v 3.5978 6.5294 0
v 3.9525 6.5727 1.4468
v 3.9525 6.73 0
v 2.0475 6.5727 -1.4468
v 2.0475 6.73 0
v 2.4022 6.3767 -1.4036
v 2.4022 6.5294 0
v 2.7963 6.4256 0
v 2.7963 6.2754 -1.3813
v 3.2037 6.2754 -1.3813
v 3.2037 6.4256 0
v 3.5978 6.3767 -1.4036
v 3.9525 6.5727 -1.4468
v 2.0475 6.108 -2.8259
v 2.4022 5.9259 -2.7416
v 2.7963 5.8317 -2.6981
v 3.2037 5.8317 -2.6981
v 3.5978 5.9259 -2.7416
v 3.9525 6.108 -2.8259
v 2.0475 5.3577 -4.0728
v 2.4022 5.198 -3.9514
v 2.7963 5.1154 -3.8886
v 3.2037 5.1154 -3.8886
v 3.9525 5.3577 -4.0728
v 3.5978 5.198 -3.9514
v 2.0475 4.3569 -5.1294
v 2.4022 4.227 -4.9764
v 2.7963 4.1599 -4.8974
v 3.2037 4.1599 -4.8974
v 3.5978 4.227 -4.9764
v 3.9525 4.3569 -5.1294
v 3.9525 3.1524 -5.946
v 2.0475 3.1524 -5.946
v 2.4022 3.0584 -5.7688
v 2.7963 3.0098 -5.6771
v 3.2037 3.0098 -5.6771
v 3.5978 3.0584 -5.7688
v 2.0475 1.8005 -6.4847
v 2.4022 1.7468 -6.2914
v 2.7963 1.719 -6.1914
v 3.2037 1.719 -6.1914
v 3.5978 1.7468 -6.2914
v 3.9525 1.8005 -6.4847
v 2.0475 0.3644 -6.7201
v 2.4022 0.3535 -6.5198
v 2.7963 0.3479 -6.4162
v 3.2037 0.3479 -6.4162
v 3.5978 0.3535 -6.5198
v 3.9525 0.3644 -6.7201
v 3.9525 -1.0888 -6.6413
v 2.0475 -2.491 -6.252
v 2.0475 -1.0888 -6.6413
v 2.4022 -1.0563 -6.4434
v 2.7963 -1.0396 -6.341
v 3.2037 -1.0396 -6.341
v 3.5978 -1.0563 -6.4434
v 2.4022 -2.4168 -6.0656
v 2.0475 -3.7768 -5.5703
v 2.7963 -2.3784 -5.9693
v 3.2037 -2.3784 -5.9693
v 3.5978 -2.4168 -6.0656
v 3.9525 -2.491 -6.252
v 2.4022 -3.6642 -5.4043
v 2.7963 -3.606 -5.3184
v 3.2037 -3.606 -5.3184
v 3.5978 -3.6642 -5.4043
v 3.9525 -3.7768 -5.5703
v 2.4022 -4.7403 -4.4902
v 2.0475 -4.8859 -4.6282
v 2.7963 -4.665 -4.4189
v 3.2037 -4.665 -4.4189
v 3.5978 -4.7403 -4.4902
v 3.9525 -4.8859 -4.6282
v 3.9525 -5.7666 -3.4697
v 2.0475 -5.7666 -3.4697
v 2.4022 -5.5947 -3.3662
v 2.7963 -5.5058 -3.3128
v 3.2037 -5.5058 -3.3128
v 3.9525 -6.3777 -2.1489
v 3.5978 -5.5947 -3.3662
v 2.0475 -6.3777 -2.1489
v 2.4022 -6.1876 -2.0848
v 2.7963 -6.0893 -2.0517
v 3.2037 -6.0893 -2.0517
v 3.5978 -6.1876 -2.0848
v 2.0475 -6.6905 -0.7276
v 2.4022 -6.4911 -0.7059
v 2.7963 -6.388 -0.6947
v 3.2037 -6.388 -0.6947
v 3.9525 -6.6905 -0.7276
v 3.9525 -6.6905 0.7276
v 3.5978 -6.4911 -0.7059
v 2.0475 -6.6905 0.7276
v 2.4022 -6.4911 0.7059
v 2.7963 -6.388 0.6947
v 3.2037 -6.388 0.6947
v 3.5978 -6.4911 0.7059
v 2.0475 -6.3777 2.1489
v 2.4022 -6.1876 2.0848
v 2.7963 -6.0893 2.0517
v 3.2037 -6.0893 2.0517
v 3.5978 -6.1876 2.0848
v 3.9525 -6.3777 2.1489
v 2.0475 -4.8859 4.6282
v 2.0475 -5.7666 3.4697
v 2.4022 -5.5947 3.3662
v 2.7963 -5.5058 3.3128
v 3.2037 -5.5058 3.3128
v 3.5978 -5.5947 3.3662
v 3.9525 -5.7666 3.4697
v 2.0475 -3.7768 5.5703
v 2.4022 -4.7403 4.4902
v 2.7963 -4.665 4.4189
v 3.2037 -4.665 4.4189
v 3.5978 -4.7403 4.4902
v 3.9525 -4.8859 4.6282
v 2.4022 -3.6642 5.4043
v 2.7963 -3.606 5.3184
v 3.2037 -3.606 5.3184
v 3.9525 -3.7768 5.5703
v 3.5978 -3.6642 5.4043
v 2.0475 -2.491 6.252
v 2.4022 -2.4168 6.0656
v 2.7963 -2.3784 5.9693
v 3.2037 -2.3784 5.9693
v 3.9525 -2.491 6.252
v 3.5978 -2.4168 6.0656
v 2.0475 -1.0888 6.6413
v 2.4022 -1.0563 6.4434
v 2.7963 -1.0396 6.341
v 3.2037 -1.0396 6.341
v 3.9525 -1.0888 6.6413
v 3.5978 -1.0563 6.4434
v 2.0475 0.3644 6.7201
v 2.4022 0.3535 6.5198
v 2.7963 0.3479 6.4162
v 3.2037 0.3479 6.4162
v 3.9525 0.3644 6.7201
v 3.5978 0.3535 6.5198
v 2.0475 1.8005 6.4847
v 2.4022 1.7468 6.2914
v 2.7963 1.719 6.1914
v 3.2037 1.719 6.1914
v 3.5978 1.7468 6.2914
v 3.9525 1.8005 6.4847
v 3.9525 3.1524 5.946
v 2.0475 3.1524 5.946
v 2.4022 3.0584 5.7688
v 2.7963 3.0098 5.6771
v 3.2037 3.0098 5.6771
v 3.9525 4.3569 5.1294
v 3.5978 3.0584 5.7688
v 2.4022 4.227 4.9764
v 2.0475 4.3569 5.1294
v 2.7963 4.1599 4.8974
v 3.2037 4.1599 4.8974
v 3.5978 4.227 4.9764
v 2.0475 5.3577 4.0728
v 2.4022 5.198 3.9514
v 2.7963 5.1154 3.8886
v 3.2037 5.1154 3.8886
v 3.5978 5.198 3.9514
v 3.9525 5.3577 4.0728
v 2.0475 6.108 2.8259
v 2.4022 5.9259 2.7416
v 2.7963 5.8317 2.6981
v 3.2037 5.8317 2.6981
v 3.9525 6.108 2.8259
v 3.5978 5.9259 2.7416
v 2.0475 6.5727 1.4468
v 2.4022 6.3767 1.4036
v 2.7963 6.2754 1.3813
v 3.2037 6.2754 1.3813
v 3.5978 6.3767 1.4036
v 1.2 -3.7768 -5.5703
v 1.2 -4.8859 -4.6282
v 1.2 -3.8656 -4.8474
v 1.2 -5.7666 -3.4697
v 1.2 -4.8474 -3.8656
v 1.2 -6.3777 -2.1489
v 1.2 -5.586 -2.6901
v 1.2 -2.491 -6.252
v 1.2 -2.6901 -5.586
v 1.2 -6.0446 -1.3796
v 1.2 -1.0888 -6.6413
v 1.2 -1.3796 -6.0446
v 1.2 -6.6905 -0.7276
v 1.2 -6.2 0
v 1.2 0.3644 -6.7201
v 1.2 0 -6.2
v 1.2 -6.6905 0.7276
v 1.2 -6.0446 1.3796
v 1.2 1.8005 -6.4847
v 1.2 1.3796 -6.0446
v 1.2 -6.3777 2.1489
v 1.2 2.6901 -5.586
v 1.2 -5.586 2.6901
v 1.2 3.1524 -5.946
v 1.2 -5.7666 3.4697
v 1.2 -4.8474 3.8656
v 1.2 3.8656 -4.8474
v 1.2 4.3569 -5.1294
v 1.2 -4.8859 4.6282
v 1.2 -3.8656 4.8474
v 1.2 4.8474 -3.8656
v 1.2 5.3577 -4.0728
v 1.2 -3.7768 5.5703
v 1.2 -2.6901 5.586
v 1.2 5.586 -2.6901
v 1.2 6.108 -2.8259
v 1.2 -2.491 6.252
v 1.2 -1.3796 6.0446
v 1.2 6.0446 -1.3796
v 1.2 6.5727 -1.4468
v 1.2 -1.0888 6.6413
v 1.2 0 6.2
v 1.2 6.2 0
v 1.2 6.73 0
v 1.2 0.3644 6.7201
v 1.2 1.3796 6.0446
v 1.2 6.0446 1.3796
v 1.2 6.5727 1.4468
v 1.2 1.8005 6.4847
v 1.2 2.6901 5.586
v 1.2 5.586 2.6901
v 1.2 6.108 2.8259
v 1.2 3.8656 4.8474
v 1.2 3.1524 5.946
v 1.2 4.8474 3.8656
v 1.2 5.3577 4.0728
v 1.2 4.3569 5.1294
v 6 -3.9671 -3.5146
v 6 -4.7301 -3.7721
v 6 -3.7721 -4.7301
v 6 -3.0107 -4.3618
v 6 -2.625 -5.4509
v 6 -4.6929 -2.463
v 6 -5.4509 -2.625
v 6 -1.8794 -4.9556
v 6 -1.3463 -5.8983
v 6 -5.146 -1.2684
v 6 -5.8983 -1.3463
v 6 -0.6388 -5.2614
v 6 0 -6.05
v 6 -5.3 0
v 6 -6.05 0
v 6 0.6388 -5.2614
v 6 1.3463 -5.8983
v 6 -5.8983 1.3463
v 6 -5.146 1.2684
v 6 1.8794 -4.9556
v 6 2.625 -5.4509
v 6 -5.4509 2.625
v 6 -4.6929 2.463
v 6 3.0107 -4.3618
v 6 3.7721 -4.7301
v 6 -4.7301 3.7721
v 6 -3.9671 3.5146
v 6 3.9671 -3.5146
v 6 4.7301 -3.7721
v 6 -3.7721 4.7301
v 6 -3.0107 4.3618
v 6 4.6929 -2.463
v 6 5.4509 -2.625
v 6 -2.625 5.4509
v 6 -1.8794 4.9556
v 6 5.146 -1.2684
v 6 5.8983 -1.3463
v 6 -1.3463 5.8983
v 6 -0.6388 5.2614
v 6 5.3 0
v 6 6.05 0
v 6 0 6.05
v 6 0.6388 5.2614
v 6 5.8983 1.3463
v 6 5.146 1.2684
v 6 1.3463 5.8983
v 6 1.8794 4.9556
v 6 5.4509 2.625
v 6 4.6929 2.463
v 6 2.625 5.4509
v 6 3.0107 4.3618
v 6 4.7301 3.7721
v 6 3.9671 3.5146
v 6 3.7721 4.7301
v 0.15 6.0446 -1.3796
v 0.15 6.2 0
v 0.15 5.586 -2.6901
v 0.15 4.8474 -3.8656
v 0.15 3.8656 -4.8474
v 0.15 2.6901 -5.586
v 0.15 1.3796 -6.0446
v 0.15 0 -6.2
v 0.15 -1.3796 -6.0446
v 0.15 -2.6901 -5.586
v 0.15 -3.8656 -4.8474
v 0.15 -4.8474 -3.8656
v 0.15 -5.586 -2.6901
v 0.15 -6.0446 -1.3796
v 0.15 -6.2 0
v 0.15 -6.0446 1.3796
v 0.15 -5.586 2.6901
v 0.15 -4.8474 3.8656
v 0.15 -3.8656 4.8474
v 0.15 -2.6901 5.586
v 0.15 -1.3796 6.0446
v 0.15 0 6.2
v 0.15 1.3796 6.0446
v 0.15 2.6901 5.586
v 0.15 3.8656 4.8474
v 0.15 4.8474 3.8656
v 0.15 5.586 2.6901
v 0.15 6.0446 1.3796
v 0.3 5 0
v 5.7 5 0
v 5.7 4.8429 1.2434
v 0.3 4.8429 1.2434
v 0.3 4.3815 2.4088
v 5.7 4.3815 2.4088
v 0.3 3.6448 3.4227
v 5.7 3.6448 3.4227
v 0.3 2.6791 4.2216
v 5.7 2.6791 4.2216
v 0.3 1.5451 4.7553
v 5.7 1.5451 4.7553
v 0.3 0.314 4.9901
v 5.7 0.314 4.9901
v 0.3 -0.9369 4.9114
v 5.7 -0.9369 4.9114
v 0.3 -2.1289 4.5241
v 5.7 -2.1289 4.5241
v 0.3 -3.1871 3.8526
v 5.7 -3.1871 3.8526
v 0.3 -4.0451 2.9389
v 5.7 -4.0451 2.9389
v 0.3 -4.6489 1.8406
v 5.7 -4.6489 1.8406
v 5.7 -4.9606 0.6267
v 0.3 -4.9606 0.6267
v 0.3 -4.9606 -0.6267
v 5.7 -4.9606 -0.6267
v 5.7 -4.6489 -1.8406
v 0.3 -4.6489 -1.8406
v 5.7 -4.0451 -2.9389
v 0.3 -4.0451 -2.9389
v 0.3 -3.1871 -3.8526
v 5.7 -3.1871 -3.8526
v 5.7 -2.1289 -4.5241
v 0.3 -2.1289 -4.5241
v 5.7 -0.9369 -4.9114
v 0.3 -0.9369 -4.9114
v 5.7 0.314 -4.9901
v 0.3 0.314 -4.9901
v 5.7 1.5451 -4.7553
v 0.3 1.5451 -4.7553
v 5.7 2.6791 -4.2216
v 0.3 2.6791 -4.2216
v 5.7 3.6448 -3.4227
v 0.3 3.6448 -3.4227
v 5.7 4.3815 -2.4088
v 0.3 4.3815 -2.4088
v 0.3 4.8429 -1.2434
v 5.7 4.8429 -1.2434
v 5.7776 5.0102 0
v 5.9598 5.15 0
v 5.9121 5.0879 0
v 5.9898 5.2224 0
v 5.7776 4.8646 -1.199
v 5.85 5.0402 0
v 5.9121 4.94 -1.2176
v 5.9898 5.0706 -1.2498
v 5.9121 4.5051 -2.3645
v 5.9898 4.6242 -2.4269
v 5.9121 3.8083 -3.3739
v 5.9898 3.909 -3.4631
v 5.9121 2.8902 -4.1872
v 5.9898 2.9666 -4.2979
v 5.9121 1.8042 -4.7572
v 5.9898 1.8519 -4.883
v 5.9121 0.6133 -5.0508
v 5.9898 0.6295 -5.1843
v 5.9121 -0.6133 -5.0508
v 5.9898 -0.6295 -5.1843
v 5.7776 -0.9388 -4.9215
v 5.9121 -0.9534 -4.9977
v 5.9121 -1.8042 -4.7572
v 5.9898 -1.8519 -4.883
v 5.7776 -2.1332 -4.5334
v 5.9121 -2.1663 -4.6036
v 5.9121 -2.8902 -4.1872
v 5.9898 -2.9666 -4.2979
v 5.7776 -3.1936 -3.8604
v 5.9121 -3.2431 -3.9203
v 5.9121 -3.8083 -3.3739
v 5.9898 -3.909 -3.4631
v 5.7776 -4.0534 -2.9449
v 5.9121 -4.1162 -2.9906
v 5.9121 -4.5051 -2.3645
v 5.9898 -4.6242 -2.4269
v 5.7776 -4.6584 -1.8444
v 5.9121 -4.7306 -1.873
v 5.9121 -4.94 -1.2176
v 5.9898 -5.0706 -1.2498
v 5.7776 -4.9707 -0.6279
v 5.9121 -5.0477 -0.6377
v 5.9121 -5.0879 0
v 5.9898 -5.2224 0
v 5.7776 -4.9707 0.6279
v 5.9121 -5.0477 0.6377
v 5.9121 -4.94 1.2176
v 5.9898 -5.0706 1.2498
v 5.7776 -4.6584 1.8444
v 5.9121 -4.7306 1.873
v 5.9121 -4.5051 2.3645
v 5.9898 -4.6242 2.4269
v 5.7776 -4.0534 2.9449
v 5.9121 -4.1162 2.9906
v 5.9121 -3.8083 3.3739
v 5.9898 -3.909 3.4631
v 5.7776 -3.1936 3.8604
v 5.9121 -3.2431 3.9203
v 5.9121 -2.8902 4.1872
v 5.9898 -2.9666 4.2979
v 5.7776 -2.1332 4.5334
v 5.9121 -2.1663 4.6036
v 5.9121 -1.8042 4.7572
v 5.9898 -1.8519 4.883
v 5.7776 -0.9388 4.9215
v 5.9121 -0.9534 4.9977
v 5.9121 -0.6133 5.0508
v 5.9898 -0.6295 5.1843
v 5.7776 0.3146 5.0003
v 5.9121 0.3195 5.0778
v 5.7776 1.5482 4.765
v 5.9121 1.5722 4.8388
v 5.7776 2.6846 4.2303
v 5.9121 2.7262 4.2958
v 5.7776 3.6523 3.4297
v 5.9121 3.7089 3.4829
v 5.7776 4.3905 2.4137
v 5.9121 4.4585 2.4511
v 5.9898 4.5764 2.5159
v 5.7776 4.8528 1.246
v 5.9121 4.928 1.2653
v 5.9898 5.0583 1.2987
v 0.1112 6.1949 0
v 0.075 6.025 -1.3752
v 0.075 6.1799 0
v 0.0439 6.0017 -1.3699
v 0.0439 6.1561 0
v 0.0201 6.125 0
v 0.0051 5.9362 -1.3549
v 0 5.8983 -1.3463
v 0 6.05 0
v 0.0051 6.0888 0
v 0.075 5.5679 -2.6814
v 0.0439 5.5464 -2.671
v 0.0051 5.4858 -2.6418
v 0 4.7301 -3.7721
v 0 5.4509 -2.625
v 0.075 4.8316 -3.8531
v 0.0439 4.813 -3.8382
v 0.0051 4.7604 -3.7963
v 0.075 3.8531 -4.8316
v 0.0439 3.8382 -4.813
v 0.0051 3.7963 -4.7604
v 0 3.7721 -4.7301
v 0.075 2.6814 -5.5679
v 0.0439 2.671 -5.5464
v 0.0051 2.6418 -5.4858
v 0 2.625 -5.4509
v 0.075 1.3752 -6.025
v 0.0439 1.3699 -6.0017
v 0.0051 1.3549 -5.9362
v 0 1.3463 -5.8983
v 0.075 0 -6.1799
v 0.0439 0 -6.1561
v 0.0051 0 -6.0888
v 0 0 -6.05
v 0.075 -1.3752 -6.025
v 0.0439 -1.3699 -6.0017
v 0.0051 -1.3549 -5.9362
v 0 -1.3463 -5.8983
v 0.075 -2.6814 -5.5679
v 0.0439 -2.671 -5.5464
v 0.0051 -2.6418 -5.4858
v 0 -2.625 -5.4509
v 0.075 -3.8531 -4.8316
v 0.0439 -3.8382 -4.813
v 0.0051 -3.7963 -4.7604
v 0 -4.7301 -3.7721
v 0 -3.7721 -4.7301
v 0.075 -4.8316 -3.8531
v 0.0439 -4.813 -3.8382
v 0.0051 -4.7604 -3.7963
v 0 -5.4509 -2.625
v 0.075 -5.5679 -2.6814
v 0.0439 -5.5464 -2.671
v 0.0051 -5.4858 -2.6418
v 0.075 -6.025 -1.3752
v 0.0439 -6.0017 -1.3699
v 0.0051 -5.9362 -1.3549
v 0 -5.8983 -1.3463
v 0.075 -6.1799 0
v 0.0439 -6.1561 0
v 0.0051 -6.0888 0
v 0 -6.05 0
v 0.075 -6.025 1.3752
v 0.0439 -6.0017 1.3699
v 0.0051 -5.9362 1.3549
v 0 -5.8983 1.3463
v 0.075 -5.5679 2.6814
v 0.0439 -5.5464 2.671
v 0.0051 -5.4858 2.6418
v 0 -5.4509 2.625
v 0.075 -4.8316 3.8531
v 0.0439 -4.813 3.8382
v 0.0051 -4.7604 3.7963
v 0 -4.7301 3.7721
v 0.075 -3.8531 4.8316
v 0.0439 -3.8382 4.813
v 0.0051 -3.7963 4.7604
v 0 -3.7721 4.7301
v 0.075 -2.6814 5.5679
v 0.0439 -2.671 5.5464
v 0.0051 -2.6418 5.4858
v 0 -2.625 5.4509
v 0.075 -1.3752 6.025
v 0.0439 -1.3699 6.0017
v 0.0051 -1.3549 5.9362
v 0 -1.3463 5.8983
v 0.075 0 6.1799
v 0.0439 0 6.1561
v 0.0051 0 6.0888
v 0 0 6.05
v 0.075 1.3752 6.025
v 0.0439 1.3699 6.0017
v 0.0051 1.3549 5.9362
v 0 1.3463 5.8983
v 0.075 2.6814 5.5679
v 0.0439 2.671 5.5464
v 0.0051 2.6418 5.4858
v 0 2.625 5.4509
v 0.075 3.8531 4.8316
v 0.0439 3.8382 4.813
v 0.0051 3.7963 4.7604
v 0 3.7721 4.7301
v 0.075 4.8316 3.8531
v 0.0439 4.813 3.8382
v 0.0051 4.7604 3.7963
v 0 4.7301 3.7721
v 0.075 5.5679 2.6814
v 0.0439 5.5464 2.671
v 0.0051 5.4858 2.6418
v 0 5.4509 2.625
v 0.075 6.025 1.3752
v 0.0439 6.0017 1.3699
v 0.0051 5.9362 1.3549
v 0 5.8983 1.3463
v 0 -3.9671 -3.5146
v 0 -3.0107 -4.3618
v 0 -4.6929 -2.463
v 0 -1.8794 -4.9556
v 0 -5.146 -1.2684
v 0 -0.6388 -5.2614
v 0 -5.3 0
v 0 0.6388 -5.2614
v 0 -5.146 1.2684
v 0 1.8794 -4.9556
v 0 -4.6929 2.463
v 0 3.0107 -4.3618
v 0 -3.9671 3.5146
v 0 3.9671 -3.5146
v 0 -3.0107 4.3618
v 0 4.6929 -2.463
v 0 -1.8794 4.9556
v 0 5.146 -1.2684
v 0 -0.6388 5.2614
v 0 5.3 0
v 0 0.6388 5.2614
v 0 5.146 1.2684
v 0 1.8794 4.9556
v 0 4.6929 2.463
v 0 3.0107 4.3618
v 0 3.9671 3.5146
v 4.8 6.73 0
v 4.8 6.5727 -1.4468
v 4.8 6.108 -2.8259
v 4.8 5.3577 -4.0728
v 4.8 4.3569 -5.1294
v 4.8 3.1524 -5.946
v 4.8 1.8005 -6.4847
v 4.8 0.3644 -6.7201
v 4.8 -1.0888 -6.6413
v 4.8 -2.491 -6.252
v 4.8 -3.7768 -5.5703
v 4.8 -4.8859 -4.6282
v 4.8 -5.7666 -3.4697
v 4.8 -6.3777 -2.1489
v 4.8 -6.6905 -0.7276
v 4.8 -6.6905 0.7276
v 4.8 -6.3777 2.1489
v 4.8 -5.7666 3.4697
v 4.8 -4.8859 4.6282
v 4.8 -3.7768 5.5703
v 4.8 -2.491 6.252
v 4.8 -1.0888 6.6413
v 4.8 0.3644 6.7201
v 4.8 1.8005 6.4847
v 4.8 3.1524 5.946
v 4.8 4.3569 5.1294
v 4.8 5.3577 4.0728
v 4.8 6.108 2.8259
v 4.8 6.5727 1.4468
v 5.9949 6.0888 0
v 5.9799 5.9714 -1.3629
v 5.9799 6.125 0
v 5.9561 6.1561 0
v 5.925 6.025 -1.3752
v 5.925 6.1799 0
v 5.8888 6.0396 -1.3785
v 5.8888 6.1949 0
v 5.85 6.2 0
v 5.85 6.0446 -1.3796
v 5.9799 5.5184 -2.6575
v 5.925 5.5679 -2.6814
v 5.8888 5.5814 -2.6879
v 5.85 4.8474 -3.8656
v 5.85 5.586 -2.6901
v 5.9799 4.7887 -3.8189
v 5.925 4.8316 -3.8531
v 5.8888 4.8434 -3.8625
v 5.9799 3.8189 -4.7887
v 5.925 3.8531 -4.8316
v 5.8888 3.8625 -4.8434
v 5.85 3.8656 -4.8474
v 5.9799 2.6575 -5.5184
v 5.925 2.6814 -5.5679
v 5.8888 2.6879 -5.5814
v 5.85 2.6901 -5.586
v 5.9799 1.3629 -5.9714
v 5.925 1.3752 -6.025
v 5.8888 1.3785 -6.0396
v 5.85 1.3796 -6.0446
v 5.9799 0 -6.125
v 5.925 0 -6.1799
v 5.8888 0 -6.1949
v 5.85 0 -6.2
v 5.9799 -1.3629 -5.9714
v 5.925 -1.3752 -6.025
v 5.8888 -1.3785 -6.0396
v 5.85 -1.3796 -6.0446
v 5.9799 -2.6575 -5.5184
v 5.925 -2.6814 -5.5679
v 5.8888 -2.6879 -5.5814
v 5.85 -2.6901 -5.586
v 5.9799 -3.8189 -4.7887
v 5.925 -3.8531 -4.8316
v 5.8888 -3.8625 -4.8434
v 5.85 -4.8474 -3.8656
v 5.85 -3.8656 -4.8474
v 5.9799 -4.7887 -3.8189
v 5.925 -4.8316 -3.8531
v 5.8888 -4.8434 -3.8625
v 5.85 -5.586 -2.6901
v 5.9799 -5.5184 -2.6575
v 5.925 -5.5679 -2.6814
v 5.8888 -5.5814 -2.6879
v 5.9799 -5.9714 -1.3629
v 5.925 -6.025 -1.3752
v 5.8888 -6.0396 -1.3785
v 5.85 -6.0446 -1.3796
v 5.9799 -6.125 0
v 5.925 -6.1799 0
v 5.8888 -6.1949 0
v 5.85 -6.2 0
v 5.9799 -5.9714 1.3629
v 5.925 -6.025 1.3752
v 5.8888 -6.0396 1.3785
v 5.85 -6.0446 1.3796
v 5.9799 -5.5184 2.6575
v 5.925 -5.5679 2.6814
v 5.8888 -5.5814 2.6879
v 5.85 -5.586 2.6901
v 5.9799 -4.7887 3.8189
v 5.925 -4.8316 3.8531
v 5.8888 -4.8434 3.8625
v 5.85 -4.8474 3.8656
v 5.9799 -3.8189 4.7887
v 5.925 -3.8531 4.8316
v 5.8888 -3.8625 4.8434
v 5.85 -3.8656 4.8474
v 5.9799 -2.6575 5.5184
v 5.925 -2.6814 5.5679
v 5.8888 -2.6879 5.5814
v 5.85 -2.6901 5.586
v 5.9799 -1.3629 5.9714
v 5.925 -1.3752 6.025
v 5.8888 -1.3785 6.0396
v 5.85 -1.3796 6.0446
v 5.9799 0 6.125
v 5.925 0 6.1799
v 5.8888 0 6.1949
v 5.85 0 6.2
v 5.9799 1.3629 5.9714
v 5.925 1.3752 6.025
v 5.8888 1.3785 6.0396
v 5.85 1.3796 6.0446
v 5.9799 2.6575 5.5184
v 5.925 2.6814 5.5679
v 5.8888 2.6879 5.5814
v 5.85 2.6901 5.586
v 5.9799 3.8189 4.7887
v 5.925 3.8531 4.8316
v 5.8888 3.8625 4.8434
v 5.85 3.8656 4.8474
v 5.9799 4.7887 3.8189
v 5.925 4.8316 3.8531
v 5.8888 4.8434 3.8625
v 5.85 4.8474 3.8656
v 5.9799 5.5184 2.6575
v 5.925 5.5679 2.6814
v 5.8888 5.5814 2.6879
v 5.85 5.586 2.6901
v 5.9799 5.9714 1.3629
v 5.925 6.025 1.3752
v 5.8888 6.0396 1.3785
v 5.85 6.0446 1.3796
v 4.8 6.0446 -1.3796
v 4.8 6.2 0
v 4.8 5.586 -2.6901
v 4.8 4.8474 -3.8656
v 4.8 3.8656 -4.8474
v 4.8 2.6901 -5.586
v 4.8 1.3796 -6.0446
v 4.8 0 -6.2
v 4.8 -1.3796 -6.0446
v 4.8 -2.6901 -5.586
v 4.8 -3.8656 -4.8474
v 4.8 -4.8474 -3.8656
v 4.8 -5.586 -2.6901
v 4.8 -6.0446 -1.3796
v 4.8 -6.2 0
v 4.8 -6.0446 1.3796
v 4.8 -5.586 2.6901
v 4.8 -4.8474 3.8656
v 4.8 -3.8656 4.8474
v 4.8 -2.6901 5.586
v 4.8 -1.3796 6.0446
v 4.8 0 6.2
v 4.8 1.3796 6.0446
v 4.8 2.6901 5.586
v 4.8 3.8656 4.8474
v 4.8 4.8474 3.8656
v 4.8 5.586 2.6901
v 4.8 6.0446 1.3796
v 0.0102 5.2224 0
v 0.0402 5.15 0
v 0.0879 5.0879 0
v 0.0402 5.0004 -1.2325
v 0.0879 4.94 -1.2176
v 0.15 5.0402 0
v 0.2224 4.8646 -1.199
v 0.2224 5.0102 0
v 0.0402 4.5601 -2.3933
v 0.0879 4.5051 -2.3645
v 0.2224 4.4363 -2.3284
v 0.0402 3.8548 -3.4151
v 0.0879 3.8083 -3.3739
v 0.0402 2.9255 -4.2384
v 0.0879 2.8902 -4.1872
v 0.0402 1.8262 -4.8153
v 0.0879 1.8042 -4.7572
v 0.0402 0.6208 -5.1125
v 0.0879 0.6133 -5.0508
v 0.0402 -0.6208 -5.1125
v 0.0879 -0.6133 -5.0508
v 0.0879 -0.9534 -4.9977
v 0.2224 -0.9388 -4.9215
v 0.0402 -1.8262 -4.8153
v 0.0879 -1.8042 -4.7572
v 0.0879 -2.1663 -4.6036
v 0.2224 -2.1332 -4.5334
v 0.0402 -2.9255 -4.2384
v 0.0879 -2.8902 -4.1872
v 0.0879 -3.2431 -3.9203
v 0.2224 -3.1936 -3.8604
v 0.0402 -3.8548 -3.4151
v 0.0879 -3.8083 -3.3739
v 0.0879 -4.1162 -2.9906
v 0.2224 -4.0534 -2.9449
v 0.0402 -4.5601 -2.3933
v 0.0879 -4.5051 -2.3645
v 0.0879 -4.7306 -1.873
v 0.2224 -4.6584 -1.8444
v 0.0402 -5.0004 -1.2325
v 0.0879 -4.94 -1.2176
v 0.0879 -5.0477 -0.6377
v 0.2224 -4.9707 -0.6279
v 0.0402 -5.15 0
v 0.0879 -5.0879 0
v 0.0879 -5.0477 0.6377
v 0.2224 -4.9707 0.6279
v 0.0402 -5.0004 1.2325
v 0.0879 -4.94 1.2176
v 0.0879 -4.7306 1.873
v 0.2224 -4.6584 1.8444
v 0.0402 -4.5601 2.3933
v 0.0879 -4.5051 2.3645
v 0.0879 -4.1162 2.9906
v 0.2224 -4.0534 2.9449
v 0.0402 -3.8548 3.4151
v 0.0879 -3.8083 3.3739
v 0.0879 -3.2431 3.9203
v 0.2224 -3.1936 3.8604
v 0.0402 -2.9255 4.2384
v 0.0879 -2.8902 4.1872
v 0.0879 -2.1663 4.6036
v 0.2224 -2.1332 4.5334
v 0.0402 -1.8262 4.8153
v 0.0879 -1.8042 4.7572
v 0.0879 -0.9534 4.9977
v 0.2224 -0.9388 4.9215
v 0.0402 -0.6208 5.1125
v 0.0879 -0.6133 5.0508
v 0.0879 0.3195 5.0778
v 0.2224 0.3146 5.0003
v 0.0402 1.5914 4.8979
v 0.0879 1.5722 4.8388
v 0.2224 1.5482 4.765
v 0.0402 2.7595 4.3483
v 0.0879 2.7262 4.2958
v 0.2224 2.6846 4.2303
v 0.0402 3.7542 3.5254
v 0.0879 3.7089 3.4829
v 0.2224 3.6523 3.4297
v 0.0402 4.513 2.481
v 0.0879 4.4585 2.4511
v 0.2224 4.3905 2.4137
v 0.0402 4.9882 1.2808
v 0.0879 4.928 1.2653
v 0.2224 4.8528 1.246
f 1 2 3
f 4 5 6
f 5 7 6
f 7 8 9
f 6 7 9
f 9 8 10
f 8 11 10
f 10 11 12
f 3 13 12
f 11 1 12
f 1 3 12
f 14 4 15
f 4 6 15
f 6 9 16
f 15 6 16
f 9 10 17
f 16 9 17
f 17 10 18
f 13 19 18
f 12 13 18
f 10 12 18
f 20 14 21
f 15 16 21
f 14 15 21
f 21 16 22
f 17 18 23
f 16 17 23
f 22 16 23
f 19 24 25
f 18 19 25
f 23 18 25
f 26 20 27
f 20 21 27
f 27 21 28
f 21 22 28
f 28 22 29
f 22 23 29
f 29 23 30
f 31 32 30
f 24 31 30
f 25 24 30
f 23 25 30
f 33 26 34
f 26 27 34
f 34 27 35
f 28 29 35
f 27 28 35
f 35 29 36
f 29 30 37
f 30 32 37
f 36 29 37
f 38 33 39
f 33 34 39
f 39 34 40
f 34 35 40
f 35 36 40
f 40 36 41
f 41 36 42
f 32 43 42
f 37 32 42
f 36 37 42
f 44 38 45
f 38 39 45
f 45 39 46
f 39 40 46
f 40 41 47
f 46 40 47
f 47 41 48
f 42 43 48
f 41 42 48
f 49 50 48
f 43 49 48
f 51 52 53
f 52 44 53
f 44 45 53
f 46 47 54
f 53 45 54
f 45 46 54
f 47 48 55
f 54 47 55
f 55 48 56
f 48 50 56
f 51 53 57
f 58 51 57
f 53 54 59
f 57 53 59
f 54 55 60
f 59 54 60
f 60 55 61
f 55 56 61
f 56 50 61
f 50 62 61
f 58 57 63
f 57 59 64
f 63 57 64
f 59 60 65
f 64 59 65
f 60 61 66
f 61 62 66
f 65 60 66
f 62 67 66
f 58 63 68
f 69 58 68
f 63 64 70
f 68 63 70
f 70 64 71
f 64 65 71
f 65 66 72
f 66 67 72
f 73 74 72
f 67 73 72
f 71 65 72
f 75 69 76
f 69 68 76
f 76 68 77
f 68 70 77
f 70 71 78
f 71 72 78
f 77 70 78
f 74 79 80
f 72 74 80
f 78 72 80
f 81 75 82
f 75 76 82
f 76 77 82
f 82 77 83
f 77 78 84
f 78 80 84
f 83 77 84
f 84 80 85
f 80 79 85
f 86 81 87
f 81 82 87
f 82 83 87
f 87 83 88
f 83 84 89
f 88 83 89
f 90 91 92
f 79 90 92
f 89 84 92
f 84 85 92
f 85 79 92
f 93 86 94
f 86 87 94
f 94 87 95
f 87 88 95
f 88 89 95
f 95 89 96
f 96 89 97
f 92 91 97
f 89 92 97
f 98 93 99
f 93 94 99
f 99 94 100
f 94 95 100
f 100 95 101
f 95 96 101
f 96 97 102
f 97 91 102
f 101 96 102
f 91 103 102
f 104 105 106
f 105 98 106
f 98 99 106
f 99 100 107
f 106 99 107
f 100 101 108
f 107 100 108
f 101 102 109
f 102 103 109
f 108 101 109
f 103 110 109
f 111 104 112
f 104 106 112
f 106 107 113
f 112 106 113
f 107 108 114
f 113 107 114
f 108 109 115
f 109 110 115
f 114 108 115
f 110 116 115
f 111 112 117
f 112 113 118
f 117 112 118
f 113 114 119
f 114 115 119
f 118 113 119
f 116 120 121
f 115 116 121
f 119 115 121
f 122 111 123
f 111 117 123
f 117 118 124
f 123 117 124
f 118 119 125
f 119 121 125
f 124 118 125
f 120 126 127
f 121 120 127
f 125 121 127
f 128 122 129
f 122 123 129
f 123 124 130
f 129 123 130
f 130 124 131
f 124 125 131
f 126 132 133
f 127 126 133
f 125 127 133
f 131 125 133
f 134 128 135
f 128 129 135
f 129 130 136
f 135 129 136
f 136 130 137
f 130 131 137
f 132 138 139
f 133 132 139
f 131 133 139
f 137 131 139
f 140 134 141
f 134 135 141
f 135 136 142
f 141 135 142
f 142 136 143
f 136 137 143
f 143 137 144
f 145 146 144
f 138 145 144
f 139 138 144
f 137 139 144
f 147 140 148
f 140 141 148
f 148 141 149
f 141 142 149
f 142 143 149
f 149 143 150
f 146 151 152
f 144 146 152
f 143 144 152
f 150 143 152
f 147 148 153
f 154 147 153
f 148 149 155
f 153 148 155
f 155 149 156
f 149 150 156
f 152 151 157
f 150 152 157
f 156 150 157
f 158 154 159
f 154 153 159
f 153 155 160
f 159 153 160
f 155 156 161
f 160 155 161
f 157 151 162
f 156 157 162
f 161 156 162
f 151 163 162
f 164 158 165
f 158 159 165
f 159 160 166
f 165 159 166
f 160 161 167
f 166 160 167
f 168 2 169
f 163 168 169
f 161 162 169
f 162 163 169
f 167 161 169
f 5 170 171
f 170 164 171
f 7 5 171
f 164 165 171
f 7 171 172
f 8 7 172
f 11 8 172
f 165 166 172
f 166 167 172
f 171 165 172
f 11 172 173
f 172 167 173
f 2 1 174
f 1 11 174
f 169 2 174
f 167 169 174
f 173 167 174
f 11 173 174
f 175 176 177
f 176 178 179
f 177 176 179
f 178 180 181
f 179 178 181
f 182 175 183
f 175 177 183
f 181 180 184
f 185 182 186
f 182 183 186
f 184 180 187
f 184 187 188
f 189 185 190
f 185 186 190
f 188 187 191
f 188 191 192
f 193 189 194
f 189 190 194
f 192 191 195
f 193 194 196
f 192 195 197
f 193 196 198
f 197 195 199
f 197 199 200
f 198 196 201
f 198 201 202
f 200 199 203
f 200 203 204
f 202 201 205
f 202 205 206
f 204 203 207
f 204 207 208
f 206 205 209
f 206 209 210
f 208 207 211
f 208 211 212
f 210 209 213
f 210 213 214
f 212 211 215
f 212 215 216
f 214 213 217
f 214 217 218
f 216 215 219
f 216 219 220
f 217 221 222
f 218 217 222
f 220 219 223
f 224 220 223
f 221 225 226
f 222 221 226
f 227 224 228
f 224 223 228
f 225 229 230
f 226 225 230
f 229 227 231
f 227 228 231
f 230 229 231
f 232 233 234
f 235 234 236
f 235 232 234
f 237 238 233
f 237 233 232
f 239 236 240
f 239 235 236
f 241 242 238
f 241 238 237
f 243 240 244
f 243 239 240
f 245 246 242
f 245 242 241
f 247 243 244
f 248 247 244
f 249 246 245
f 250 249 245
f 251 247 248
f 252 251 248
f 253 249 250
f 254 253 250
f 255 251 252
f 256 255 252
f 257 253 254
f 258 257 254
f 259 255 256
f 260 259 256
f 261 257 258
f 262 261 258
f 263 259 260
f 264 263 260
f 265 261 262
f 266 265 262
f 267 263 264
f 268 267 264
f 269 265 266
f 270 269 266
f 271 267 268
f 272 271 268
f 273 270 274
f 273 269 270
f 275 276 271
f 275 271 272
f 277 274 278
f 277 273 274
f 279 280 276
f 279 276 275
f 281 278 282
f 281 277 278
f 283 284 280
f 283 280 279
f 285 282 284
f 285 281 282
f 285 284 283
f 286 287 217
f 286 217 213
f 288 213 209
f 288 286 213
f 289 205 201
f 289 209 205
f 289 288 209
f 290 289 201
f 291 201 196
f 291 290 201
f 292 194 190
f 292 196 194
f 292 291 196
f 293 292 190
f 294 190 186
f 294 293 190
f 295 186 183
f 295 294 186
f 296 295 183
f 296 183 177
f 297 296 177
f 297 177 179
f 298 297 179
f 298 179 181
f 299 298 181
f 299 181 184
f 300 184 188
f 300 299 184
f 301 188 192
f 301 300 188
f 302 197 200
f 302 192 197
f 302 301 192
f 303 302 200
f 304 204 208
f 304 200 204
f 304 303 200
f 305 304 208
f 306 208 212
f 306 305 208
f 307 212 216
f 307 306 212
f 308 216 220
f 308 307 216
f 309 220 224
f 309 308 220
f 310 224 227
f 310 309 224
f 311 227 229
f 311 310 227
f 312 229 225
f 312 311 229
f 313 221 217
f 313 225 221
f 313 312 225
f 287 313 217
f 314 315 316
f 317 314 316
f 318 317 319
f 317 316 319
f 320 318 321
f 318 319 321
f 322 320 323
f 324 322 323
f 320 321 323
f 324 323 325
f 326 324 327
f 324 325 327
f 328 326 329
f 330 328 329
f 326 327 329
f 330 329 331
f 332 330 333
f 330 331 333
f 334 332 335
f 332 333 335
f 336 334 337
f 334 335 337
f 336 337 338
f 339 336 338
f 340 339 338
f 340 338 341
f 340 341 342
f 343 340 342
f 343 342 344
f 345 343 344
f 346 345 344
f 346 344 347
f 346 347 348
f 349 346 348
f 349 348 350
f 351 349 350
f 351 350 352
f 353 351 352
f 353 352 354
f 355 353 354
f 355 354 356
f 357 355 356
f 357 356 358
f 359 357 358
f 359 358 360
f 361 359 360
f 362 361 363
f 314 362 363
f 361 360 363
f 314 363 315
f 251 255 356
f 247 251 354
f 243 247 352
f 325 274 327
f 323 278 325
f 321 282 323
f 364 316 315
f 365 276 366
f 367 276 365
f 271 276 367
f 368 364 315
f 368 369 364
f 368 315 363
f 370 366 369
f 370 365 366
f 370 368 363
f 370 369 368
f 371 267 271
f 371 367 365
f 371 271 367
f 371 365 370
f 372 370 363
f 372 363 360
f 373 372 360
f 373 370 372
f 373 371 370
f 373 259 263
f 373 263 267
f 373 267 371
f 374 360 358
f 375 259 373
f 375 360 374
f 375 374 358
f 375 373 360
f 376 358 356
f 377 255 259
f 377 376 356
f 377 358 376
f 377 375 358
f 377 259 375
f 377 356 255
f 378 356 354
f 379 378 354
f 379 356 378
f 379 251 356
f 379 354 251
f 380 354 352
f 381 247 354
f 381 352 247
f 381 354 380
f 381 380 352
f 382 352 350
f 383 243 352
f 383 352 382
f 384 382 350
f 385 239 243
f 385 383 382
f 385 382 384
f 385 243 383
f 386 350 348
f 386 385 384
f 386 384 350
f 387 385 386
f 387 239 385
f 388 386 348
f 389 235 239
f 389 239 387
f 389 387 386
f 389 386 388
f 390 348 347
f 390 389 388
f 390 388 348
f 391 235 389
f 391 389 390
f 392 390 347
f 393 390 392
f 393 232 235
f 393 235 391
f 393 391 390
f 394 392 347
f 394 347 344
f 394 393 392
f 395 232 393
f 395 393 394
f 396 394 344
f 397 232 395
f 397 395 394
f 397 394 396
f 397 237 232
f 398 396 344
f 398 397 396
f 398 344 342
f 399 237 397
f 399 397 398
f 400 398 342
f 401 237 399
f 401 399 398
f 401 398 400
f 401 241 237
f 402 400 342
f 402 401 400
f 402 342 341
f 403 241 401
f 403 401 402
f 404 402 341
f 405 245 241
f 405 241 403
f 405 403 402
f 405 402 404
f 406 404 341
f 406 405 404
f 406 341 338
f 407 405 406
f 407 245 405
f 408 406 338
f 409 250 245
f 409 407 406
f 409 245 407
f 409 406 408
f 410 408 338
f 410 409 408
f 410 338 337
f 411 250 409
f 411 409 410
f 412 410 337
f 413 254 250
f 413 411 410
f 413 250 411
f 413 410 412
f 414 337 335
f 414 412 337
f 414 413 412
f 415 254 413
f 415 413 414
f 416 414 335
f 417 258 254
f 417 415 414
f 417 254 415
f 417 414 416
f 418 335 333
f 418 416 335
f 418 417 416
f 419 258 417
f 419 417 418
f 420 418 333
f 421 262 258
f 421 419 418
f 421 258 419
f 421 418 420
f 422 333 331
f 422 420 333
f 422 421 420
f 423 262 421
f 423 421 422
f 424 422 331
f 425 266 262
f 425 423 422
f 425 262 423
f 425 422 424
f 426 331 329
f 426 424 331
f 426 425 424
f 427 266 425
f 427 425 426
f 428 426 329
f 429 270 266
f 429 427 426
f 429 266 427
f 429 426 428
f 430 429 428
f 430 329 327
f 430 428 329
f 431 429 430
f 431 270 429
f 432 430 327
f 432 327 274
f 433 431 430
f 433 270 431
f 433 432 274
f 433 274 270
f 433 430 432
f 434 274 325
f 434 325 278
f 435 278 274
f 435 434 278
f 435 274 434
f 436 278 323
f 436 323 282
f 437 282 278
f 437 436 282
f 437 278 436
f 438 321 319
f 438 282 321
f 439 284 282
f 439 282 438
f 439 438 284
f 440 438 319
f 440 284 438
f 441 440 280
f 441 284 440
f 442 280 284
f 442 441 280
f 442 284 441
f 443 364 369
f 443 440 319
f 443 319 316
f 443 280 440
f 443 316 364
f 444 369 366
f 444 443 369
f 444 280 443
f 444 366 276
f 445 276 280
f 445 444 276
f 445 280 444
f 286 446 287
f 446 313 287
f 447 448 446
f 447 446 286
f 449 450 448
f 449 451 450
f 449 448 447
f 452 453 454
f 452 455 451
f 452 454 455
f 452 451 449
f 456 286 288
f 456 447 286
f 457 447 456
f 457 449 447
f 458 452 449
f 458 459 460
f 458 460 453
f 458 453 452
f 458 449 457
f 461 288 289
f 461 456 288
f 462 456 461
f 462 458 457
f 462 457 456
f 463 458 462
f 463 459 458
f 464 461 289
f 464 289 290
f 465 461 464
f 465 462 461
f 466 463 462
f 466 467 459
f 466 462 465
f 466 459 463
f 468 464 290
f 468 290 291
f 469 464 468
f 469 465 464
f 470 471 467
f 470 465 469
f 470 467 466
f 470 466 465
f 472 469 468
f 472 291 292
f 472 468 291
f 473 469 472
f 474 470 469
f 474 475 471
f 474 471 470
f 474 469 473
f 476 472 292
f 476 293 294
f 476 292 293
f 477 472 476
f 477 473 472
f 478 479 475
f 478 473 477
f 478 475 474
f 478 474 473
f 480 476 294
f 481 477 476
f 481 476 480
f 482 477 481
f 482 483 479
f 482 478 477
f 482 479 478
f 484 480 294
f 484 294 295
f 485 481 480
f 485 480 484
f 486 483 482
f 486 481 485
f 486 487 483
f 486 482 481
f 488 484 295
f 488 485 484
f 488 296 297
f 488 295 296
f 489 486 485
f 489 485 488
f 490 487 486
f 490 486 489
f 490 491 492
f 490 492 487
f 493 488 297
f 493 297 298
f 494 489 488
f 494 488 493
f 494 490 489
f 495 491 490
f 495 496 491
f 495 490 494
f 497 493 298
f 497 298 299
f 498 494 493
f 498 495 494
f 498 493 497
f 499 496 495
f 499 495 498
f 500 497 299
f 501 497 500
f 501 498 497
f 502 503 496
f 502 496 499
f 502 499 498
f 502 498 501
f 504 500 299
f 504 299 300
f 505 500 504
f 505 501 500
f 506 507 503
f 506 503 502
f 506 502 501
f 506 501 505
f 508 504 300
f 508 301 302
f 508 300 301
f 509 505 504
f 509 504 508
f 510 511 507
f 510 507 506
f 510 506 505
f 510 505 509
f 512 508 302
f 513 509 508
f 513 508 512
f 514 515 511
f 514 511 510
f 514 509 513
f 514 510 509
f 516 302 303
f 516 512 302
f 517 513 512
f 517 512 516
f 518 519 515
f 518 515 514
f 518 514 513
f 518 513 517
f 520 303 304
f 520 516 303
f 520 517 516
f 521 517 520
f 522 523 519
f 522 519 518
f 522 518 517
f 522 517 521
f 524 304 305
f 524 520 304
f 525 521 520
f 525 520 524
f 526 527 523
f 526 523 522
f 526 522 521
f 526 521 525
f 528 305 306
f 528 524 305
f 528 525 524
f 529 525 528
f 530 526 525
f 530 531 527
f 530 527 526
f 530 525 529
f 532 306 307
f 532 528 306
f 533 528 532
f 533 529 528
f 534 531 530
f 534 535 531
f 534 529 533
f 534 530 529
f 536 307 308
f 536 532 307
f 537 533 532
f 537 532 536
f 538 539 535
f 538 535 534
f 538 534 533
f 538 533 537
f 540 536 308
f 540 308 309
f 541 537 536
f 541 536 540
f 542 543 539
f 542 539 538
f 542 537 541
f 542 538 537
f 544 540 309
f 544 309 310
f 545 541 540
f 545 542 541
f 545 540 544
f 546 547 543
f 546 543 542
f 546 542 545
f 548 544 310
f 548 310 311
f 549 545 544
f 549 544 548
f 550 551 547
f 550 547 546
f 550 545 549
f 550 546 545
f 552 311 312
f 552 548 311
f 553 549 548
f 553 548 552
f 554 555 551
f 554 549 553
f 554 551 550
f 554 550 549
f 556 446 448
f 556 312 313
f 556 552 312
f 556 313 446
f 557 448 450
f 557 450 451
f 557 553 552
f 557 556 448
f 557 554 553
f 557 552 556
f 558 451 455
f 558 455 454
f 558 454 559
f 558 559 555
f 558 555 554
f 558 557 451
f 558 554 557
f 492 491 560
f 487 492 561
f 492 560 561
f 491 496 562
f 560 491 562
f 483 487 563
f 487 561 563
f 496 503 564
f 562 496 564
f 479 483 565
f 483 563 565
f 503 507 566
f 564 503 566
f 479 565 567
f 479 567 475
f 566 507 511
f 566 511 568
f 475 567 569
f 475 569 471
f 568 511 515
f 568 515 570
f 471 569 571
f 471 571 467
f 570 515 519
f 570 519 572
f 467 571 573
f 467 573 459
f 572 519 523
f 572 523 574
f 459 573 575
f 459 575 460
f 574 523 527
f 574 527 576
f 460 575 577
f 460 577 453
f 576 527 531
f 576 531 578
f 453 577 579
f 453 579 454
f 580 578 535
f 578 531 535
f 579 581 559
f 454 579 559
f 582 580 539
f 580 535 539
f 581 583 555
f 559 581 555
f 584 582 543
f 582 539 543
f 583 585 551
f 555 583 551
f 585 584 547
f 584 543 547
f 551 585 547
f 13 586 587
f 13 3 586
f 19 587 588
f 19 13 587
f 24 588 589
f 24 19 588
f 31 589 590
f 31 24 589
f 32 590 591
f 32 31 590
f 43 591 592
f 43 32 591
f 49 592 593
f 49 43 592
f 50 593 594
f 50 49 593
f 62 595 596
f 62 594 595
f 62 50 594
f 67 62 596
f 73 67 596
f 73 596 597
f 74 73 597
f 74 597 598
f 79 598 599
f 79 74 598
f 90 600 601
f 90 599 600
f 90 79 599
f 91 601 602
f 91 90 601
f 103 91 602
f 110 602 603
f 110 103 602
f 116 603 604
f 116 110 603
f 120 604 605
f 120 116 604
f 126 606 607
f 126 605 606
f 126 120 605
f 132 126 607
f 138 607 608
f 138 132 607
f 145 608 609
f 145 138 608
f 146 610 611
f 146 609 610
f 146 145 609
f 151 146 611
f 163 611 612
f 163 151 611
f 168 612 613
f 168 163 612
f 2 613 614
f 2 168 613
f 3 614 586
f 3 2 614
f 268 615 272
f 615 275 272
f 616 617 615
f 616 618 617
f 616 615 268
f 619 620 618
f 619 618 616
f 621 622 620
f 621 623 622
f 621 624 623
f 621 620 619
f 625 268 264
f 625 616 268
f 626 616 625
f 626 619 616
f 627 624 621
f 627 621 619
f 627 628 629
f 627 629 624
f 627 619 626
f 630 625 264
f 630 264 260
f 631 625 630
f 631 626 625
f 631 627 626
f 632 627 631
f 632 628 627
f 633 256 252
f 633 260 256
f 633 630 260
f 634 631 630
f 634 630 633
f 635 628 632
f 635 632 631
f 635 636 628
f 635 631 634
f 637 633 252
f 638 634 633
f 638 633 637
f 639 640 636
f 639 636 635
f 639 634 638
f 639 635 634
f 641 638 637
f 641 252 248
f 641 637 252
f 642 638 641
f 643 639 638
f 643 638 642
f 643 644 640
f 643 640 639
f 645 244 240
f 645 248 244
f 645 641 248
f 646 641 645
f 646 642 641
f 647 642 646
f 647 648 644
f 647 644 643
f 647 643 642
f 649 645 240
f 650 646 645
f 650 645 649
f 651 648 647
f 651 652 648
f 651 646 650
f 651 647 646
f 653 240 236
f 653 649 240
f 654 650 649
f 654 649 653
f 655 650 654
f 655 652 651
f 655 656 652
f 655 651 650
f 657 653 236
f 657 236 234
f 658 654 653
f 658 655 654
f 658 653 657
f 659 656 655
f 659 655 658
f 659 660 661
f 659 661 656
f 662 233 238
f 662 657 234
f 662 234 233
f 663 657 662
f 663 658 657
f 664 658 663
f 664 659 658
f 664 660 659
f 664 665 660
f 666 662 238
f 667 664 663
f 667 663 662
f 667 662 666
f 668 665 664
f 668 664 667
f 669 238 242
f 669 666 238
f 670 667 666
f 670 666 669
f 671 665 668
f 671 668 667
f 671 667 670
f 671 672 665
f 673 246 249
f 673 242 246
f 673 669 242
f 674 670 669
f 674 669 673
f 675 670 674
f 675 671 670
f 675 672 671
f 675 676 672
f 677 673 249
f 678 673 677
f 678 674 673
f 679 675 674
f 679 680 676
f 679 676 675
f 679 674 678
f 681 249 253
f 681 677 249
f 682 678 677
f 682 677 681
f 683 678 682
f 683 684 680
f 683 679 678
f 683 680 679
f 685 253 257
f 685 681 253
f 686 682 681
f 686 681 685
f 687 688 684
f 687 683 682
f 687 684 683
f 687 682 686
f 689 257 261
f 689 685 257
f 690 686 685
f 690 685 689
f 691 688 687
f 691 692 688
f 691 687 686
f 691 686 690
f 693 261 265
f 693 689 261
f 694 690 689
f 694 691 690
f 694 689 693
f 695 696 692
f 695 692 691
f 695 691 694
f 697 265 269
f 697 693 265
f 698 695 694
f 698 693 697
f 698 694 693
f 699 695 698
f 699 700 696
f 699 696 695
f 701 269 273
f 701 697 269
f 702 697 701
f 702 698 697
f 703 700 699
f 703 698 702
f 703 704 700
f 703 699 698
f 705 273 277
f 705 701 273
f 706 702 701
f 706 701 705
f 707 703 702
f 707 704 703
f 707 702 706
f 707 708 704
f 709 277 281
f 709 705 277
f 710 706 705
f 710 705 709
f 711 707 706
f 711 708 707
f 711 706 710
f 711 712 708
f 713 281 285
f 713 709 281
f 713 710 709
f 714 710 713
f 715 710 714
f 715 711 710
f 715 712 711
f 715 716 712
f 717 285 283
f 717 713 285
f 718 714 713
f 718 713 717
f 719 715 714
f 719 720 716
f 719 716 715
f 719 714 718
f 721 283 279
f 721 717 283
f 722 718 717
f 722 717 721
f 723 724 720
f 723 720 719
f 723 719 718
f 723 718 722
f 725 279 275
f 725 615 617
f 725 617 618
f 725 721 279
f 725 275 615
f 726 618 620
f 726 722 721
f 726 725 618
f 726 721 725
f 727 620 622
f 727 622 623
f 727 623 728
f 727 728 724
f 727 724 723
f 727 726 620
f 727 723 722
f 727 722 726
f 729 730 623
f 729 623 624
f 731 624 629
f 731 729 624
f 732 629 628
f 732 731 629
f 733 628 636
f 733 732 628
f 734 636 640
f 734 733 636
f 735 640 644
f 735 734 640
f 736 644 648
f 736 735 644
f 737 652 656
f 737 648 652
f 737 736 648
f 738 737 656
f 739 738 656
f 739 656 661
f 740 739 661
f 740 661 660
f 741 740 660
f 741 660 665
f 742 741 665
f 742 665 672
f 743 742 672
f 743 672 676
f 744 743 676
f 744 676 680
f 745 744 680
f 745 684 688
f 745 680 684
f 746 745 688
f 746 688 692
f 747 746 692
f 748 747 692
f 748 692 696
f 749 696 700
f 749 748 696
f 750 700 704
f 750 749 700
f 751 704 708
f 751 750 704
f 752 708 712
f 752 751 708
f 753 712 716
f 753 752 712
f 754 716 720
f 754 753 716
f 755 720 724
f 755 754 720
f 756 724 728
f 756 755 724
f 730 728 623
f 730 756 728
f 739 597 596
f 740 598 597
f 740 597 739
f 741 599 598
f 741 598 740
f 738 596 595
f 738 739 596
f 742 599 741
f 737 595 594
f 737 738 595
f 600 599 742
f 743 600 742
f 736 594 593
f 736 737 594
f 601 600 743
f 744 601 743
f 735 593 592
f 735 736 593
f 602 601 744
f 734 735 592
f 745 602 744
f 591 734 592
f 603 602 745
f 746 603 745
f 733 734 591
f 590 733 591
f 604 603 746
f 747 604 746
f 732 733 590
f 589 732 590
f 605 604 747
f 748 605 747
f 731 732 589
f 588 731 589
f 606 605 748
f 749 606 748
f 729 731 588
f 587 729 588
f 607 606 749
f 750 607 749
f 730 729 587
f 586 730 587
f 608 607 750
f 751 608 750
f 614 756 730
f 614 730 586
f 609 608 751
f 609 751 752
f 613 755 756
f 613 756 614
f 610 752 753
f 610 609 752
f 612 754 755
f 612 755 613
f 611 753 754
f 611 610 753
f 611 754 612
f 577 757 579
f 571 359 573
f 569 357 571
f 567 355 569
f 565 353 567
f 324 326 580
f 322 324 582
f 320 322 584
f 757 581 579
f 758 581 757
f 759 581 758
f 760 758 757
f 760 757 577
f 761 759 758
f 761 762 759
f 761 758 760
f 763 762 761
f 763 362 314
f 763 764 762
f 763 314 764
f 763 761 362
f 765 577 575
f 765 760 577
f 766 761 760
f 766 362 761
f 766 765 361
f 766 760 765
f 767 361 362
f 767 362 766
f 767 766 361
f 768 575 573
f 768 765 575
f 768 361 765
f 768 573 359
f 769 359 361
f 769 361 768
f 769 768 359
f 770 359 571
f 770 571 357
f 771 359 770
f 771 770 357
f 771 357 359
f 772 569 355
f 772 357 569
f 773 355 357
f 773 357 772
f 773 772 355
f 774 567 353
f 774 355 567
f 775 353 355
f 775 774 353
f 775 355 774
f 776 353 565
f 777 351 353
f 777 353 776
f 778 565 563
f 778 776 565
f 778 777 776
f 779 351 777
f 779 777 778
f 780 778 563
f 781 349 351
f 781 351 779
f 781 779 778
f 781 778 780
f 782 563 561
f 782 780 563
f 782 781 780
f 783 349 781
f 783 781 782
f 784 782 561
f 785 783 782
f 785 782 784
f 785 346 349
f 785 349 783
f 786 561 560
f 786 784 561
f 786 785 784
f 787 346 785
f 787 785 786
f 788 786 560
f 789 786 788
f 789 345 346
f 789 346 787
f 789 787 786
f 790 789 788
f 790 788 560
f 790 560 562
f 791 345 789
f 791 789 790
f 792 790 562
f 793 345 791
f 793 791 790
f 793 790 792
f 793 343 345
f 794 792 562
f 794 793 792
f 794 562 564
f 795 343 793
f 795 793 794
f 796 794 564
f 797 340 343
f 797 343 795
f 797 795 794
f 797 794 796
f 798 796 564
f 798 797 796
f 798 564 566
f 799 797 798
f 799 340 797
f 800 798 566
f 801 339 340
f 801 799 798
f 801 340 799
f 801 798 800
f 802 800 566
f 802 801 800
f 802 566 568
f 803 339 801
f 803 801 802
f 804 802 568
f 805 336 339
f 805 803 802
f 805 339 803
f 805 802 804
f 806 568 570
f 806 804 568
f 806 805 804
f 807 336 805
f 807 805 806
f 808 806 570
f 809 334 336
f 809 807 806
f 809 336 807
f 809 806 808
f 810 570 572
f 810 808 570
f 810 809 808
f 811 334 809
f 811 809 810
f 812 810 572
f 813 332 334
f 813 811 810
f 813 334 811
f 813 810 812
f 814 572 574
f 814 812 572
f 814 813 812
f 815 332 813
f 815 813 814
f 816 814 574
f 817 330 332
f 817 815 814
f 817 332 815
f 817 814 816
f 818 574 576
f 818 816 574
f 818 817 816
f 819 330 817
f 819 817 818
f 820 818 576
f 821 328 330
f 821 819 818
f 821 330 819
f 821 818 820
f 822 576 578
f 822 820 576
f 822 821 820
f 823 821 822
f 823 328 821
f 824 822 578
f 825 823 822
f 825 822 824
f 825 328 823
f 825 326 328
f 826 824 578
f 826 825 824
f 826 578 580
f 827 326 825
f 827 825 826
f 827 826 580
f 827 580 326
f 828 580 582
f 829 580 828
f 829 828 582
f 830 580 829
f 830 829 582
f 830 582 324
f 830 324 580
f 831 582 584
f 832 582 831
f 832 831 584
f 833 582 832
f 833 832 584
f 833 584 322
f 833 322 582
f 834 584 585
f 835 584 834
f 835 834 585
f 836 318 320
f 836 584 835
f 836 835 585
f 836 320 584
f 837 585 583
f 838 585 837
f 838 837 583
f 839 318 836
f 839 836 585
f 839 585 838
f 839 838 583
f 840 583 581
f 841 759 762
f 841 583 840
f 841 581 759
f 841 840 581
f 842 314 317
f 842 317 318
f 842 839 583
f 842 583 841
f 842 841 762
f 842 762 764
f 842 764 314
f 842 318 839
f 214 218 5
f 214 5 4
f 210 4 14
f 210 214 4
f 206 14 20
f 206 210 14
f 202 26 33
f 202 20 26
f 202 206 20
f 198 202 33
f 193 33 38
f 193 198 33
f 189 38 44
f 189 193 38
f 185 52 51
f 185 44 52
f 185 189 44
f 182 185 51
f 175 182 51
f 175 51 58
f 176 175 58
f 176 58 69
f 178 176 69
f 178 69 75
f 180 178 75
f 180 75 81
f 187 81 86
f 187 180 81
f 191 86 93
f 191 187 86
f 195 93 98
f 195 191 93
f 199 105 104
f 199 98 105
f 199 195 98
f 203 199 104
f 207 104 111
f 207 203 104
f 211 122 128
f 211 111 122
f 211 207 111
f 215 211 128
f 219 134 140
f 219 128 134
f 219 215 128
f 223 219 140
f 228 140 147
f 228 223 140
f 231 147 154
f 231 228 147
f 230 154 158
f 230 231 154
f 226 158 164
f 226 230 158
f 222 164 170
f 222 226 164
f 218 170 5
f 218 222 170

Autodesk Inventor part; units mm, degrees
sketch "Sketch_6" plane through (0, 0, 0) normal (0, 0, 1) x (1, 0, 0)
  line L0 (6, 0) -> (0, 0)
  line L1 (0, 6.05) -> (0, 5.3)
  arc A0 (0, 5.3) -> (0.3, 5) centre (0.3, 5.3) ccw
  line L2 (0.3, 5) -> (5.7, 5)
  arc A1 (5.7, 5) -> (6, 5.3) centre (5.7, 5.3) ccw
  line L3 (6, 5.3) -> (6, 6.05)
  arc A2 (6, 6.05) -> (5.85, 6.2) centre (5.85, 6.05) ccw
  line L4 (5.85, 6.2) -> (4.8, 6.2)
  line L5 (4.8, 6.2) -> (4.8, 6.73)
  line L6 (4.8, 6.73) -> (3.9525, 6.73)
  arc A3 (2.0475, 6.73) -> (3.9525, 6.73) centre (3, 8) ccw
  line L7 (2.0475, 6.73) -> (1.2, 6.73)
  line L8 (1.2, 6.73) -> (1.2, 6.2)
  line L9 (1.2, 6.2) -> (0.15, 6.2)
  arc A4 (0.15, 6.2) -> (0, 6.05) centre (0.15, 6.05) ccw
revolve "Revolution1" add sketch "Sketch_6" angle 360 about axis through (6, 0, 0) along (1, 0, 0)
ref_plane "1_XY" through (3, 0, 0) normal (1, 0, 0) x (0, 0, -1)
ref_plane "1_YZ" through (3, 0, 0) normal (0, 0, -1) x (0, 1, 0)
ref_plane "1_ZX" through (3, 0, 0) normal (0, 1, 0) x (1, 0, 0)
ref_plane "Dummy_XY" through (0, 0, 0) normal (1, 0, 0) x (0, 0, -1)
ref_plane "Dummy_YZ" through (0, 0, 0) normal (0, 0, -1) x (0, 1, 0)
ref_plane "Dummy_ZX" through (0, 0, 0) normal (0, 1, 0) x (1, 0, 0)
ref_plane "shield1_XY" through (0.4, 0, 0) normal (1, 0, 0) x (0, 0, -1)
ref_plane "shield1_YZ" through (0.4, 0, 0) normal (0, 0, -1) x (0, 1, 0)
ref_plane "shield1_ZX" through (0.4, 0, 0) normal (0, 1, 0) x (1, 0, 0)
ref_plane "shield2_XY" through (5.6, 0, 0) normal (-1, 0, 0) x (0, 0, -1)
ref_plane "shield2_YZ" through (5.6, 0, 0) normal (0, 0, -1) x (0, -1, 0)
ref_plane "shield2_ZX" through (5.6, 0, 0) normal (0, -1, 0) x (-1, 0, 0)
properties part number "RF-2210X2HH_ir"
